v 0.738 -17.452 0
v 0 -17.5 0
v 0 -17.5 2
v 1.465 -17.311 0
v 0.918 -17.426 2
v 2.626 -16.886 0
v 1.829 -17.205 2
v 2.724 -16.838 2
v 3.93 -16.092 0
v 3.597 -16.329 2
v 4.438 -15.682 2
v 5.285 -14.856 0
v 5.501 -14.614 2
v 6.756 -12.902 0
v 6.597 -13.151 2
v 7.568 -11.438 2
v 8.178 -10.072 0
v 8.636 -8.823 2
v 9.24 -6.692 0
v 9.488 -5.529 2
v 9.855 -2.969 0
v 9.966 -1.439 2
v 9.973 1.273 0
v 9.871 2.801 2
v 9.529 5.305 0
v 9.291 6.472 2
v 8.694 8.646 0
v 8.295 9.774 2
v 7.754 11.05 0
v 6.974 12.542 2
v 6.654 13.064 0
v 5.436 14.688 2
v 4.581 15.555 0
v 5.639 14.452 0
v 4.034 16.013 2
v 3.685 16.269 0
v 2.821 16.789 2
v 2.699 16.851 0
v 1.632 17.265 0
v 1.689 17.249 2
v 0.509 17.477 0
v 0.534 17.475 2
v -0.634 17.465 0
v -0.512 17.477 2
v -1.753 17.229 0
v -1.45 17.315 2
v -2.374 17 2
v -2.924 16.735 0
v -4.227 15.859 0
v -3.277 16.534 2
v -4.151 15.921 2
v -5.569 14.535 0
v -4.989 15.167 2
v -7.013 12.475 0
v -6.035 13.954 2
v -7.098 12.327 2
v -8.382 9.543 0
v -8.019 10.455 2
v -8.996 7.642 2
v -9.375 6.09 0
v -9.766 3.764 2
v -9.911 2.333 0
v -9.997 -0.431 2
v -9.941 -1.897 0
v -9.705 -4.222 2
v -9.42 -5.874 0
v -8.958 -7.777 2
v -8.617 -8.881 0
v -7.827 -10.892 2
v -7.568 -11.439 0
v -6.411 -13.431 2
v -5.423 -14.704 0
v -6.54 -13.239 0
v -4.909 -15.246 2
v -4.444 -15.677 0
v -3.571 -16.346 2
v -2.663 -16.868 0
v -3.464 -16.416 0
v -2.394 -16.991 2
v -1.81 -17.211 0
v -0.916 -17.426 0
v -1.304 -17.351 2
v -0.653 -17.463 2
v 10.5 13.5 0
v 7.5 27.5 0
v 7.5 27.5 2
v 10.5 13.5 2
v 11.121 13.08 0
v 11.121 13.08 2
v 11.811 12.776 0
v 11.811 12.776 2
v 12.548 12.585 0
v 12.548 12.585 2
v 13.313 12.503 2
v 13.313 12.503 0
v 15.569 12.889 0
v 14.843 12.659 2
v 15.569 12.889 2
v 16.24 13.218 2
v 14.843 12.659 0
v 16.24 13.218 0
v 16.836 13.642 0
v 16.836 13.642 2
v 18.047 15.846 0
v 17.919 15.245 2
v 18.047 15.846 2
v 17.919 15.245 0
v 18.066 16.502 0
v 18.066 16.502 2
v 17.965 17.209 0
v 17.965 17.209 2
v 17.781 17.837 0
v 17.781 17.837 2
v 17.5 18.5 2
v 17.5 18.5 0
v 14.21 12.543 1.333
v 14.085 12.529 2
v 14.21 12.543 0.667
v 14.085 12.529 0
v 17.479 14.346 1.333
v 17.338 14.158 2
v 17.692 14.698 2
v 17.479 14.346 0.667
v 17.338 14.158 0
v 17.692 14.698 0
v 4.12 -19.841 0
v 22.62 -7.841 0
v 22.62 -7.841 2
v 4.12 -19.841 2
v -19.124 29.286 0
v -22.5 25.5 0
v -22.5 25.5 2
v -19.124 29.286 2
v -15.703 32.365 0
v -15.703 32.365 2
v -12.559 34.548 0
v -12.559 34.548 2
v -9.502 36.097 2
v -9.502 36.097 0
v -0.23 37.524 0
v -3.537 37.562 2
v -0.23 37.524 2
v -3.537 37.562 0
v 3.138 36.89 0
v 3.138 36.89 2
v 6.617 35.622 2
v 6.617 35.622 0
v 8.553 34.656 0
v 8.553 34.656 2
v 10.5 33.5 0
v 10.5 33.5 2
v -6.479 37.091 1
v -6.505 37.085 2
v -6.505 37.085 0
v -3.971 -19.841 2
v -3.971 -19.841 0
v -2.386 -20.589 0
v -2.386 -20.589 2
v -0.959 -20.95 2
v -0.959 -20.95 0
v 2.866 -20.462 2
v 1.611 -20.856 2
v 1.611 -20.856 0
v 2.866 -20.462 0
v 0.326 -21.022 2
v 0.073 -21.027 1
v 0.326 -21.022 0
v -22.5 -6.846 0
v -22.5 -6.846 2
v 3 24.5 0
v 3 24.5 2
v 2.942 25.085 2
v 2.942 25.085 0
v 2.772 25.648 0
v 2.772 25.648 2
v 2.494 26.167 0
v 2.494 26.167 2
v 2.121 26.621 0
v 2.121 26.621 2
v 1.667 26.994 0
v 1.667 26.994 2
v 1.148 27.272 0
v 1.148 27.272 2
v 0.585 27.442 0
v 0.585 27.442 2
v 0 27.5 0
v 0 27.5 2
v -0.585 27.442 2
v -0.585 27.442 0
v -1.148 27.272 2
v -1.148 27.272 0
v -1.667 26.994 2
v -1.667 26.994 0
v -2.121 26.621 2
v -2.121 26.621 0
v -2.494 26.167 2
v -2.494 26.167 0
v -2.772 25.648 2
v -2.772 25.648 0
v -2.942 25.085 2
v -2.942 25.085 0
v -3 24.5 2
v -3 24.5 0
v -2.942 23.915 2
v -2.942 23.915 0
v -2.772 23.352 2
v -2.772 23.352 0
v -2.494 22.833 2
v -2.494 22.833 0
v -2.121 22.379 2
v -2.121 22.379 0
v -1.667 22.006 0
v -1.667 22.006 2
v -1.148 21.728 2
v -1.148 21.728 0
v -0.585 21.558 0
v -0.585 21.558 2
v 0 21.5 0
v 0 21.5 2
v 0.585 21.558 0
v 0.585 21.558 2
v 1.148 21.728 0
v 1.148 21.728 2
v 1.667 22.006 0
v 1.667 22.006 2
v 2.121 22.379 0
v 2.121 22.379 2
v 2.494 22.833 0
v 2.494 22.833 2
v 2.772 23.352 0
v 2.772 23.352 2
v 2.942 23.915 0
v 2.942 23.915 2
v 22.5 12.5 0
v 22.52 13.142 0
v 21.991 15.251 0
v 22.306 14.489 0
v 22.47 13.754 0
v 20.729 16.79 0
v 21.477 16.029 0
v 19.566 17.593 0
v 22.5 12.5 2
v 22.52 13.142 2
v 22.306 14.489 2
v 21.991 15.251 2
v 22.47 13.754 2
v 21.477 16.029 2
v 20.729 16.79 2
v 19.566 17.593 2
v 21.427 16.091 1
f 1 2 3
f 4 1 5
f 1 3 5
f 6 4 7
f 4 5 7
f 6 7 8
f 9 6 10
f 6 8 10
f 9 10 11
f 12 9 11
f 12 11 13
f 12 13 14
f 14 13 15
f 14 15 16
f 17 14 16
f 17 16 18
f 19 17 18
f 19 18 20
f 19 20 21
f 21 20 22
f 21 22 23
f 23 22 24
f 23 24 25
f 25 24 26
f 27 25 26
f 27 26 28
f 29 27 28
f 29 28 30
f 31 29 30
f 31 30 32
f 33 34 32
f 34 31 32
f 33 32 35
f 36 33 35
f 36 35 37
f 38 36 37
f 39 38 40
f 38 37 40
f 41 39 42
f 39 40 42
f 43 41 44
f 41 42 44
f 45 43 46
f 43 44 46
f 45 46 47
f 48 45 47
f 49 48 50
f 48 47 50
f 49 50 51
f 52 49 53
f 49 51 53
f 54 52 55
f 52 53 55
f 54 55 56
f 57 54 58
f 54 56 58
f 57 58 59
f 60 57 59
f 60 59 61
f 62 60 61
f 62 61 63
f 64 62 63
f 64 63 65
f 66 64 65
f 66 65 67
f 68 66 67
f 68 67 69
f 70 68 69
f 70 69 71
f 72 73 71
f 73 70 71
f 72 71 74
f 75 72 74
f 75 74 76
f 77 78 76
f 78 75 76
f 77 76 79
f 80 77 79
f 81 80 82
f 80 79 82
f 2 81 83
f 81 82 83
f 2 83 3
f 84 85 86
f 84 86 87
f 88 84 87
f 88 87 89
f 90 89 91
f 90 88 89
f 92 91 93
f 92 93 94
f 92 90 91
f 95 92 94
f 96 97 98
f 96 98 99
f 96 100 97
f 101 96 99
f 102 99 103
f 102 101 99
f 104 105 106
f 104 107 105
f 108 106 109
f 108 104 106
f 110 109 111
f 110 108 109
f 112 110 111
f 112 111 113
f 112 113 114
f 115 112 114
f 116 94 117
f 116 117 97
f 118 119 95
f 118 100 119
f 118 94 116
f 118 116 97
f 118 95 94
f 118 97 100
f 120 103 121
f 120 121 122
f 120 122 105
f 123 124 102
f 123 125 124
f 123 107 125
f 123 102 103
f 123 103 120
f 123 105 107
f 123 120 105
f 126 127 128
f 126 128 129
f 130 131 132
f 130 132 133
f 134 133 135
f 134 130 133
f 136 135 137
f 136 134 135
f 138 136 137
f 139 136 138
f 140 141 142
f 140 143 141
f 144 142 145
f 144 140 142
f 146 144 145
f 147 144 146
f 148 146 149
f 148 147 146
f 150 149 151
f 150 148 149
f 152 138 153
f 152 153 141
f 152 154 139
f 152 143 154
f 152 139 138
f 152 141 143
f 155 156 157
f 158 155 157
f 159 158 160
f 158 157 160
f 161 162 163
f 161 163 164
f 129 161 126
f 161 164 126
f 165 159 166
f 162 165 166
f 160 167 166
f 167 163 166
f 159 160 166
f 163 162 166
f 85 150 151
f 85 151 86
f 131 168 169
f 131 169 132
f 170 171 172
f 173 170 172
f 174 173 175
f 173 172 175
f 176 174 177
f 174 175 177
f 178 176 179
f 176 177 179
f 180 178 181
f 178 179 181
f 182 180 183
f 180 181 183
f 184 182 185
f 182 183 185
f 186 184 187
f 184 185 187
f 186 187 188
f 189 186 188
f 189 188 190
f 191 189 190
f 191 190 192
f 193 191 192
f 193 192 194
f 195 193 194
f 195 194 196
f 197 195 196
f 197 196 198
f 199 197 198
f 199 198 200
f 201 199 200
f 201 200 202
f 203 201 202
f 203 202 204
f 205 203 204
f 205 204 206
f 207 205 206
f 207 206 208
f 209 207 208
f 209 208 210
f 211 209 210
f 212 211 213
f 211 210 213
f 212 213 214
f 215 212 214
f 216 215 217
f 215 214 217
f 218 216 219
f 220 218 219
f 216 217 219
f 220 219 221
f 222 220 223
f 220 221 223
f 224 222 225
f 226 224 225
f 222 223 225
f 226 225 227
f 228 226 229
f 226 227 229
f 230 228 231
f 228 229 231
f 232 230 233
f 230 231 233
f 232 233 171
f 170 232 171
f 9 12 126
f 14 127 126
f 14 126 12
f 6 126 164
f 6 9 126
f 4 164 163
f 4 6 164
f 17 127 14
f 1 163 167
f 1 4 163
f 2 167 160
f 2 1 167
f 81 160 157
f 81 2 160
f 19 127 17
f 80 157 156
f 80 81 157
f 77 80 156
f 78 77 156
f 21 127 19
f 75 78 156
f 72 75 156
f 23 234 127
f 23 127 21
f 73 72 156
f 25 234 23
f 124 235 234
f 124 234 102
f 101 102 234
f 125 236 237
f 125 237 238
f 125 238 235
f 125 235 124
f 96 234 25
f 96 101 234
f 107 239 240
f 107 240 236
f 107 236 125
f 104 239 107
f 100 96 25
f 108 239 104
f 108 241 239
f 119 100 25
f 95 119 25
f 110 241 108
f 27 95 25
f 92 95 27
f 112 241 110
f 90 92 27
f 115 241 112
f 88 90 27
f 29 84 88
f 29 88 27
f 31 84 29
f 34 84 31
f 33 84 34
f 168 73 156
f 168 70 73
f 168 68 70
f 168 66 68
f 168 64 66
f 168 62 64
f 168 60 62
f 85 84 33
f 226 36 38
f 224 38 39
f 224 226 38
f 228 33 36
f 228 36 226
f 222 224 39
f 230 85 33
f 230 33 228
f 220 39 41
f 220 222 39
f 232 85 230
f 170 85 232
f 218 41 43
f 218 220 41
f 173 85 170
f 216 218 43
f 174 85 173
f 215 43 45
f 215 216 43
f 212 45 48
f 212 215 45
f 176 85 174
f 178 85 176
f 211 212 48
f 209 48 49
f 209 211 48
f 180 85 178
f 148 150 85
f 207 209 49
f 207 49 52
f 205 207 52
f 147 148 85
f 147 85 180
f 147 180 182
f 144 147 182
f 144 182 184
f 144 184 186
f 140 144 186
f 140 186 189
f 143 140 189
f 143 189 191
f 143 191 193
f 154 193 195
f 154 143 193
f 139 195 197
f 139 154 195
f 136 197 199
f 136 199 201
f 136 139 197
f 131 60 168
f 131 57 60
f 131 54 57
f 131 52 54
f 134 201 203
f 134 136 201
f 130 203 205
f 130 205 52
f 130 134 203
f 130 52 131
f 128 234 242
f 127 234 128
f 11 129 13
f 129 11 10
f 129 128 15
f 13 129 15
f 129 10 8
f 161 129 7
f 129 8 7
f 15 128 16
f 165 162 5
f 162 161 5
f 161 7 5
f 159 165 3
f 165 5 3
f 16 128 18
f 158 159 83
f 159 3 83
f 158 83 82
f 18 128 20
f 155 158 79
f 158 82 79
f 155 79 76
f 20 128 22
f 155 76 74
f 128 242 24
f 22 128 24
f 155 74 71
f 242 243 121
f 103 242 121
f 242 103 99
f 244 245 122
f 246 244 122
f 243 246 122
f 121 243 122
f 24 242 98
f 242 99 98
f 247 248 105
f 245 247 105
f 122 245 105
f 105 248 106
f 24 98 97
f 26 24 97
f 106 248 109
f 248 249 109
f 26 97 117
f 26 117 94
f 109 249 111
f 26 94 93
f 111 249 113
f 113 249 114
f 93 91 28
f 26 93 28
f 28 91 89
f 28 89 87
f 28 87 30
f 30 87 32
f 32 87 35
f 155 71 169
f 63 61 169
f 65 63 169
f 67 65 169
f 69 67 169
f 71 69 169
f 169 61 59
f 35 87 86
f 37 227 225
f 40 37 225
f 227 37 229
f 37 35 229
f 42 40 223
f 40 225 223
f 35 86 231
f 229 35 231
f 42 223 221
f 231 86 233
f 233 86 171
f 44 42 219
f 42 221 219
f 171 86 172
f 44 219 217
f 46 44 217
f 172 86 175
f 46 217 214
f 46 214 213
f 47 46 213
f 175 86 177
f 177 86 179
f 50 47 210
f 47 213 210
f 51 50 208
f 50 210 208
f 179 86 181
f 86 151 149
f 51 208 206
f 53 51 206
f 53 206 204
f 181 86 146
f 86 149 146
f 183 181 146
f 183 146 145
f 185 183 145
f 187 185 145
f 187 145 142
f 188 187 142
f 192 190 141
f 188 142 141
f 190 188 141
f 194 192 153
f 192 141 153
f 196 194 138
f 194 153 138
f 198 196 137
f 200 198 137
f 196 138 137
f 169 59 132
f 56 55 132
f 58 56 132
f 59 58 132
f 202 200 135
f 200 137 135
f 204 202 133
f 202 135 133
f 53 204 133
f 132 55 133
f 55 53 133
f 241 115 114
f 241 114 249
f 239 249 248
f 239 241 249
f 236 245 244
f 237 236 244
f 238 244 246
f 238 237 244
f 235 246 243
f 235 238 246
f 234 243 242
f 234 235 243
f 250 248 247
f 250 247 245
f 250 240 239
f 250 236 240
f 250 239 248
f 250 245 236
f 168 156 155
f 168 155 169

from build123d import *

# Parameters (mm, degrees)
BOSS_EXTRUDE1_DEPTH = 2
SKETCH2_R           = 3
CUT_EXTRUDE1_DEPTH  = 44.941077942
SKETCH3_RX          = 17.5
SKETCH3_RY          = 10
CUT_EXTRUDE2_DEPTH  = 44.941077942


with BuildPart() as part:
    # Sketch1 → Boss-Extrude1 (new body)
    with BuildSketch(Plane.XY):
        with BuildLine():
            Line((10.5, 33.5), (7.5, 27.5))
            Line((7.5, 27.5), (10.5, 13.5))
            add(Edge.make_bspline(
                [(10.5, 13.5), (13.496182411, 11.027569171), (20.037267901, 13.306377108), (17.5, 18.5)],
                knots=[0, 0, 0, 0, 1, 1, 1, 1], degree=3))
            add(Edge.make_bspline(
                [(17.5, 18.5), (22.853553391, 16.681980515), (22.5, 12.5)],
                knots=[0, 0, 0, 1, 1, 1], degree=2))
            Line((22.5, 12.5), (22.62041986, -7.841479807))
            Line((22.62041986, -7.841479807), (4.12041986, -19.841479807))
            add(Edge.make_bspline(
                [(-3.970513587, -19.841479807), (0.071073188, -22.212443979), (4.12041986, -19.841479807)],
                knots=[0, 0, 0, 1, 1, 1], degree=2))
            Line((-3.970513587, -19.841479807), (-22.5, -6.845777179))
            Line((-22.5, -6.845777179), (-22.5, -4.500101611))
            Line((-22.5, -4.500101611), (-22.5, 25.5))
            add(Edge.make_bspline(
                [(-22.5, 25.5), (-6.957614564, 44.682729257), (10.5, 33.5)],
                knots=[0, 0, 0, 1, 1, 1], degree=2))
        make_face()
    extrude(amount=BOSS_EXTRUDE1_DEPTH)

    # Sketch2 → Cut-Extrude1 (cut, through all)
    with BuildSketch(Plane.XY.offset(2)):
        with Locations((0, 24.5)):
            Circle(SKETCH2_R)
    extrude(amount=-CUT_EXTRUDE1_DEPTH, mode=Mode.SUBTRACT)

    # Sketch3 → Cut-Extrude2 (cut, through all)
    with BuildSketch(Plane.XY.offset(2)):
        with Locations(Location((0, 0), (0, 0, -90))):
            Ellipse(SKETCH3_RX, SKETCH3_RY)
    extrude(amount=-CUT_EXTRUDE2_DEPTH, mode=Mode.SUBTRACT)


solid = part.part
